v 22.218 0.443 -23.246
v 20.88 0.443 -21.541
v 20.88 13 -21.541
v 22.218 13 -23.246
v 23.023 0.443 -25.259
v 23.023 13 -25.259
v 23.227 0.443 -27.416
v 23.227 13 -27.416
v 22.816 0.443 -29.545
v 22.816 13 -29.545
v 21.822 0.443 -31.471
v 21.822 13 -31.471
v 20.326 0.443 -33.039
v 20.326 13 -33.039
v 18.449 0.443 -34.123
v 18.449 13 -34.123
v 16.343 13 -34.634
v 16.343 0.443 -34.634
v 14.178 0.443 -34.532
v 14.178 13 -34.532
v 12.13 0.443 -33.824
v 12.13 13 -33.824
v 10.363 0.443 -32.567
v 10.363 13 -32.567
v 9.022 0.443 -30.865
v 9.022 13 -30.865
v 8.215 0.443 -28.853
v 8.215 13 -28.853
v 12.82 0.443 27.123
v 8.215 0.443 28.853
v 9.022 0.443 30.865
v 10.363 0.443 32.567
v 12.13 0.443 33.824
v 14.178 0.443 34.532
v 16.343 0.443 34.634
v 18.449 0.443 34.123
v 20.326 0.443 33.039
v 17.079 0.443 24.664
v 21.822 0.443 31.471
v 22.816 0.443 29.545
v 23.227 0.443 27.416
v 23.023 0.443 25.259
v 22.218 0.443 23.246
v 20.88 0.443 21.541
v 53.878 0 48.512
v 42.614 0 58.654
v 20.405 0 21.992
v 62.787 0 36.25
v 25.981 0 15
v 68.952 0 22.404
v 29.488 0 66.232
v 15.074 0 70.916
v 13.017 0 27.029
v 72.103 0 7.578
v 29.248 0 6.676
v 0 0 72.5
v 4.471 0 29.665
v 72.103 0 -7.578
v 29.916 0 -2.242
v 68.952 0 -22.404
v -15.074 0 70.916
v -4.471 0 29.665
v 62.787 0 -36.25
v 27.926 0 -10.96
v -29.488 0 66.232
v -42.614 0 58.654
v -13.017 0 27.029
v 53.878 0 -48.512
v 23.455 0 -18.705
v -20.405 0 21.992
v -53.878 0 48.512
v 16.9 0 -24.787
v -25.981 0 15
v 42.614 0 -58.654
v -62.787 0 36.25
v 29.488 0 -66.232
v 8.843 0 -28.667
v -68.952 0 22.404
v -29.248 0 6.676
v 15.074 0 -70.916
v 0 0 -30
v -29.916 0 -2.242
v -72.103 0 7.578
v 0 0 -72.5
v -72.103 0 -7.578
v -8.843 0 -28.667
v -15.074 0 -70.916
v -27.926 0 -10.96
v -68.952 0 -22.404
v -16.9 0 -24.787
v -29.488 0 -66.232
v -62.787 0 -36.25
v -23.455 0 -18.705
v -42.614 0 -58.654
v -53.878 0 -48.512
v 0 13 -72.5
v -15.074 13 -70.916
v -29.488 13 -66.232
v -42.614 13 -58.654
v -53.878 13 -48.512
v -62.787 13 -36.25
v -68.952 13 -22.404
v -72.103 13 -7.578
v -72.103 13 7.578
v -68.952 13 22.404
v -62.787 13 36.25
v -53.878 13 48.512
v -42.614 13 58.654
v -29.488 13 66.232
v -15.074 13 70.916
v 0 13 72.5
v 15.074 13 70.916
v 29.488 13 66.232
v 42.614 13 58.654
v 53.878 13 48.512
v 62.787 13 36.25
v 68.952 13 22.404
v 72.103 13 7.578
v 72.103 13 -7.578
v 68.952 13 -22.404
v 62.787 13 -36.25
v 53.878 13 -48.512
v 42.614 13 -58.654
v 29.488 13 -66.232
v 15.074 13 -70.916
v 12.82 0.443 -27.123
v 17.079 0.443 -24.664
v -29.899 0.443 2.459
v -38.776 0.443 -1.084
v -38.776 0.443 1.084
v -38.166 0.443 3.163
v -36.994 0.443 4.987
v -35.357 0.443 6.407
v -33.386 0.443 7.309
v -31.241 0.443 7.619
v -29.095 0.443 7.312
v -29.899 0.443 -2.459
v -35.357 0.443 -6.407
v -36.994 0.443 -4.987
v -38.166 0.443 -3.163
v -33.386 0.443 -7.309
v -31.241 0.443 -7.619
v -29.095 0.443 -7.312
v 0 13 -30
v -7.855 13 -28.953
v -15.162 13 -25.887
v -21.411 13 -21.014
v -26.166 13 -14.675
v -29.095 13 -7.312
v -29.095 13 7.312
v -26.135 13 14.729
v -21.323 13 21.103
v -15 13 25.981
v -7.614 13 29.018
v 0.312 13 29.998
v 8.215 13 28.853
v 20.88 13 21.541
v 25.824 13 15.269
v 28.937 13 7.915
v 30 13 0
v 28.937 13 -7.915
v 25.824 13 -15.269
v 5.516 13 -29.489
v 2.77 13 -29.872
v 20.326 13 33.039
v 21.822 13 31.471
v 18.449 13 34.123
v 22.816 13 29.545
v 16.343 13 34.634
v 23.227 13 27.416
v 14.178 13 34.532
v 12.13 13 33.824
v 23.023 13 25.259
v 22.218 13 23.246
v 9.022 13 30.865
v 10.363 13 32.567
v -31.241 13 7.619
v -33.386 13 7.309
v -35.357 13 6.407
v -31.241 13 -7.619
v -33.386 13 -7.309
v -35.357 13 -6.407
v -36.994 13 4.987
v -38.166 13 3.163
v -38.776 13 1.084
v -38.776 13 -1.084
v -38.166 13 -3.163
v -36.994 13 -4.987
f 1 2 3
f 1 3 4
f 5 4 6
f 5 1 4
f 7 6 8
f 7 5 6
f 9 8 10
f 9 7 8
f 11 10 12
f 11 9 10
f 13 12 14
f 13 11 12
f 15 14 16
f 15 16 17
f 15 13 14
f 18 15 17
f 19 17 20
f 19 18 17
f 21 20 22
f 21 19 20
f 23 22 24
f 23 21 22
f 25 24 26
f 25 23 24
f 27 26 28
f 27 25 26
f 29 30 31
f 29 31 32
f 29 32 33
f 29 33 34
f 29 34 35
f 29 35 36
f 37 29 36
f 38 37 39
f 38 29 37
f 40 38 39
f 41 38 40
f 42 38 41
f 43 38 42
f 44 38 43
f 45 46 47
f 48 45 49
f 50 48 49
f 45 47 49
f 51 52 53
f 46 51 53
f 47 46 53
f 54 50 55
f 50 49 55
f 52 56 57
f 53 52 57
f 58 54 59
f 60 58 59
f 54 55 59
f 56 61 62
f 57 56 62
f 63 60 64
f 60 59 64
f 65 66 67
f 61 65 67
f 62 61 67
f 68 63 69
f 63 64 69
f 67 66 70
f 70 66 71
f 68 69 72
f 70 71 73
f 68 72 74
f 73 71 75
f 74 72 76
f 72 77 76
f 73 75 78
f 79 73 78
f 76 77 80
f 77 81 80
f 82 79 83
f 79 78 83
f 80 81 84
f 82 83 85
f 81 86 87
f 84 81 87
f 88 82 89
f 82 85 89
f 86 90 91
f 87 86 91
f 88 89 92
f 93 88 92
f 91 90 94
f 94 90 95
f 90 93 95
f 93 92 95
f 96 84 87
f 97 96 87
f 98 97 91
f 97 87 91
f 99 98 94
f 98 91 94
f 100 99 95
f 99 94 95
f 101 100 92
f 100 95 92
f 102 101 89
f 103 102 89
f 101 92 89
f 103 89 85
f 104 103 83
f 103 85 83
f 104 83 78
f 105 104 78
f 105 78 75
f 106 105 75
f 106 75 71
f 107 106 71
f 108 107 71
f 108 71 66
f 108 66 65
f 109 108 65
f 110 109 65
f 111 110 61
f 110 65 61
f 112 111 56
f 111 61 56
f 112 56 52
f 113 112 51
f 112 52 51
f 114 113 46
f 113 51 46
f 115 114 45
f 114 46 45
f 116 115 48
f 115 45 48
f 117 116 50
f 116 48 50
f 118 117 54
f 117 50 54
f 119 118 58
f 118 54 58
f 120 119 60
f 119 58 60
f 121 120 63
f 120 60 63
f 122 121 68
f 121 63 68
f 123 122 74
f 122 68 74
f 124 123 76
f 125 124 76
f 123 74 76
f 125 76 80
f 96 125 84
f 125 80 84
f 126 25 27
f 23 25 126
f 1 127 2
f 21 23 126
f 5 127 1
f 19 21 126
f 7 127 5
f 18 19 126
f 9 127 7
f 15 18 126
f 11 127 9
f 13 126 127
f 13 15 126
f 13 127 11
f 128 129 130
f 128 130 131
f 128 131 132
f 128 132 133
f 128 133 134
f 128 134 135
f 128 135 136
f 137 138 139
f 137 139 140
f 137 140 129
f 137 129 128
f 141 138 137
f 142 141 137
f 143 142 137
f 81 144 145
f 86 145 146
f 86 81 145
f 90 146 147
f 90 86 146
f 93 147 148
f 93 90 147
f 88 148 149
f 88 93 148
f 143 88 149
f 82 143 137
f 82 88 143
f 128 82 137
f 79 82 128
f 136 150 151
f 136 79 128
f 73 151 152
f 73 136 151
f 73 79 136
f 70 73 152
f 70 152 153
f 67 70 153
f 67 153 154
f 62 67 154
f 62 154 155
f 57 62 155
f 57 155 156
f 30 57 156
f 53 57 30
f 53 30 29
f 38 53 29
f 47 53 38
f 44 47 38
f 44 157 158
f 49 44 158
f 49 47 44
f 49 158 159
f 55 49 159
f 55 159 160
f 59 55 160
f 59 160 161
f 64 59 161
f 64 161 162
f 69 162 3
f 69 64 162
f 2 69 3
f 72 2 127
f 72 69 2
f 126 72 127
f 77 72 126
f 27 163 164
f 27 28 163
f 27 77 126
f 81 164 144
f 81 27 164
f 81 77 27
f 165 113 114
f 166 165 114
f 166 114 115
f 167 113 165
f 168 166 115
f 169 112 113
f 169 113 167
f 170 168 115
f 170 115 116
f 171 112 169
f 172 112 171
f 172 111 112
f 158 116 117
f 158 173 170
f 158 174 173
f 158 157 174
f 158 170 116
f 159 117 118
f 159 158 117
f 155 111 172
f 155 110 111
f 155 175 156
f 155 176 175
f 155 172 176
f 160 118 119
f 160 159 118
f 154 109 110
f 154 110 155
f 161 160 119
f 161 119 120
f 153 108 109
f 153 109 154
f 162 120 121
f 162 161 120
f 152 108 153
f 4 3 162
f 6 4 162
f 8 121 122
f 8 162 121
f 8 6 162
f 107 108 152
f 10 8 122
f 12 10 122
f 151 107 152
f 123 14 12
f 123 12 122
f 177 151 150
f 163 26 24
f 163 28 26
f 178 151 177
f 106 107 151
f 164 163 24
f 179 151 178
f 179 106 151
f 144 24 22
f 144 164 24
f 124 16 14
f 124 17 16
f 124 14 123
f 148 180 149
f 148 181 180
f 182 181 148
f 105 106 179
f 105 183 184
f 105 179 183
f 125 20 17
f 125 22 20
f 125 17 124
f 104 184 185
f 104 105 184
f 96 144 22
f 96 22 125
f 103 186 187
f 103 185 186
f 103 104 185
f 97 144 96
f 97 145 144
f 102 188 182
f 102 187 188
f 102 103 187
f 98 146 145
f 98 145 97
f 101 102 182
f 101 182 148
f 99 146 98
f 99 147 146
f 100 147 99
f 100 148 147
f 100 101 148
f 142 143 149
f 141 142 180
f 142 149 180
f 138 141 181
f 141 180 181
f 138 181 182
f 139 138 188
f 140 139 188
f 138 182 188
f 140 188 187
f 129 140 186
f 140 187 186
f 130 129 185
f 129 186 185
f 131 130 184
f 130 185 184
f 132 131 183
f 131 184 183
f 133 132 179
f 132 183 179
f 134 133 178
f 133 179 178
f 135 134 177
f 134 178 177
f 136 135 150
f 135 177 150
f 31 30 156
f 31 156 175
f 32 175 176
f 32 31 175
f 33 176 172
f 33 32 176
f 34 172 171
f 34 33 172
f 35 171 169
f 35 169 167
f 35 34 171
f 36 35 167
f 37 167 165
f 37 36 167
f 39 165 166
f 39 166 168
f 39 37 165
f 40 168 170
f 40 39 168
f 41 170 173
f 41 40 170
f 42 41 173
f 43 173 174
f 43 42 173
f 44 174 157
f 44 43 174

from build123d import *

# Parameters (mm, degrees)
SKETCH1_R           = 72.5
BOSS_EXTRUDE1_DEPTH = 13
SKETCH2_R           = 30
CUT_EXTRUDE1_DEPTH  = 104.351342517
SKETCH3_R           = 7.618751991
CUT_EXTRUDE2_DEPTH  = 12.556649537
CIRPATTERN1_COUNT   = 3


with BuildPart() as part:
    # Sketch1 → Boss-Extrude1 (new body)
    with BuildSketch(Plane(origin=(0, 0, 0), x_dir=(1, 0, 0), z_dir=(0, 1, 0))):
        Circle(SKETCH1_R)
    extrude(amount=BOSS_EXTRUDE1_DEPTH)

    # Sketch2 → Cut-Extrude1 (cut, through all)
    with BuildSketch(Plane(origin=(0, 0, 0), x_dir=(1, 0, 0), z_dir=(0, 1, 0))):
        Circle(SKETCH2_R)
    extrude(amount=CUT_EXTRUDE1_DEPTH, mode=Mode.SUBTRACT)

    # Sketch3 → Cut-Extrude2 (cut)
    with BuildSketch(Plane(origin=(0, 13, 0), x_dir=(1, 0, 0), z_dir=(0, 1, 0))):
        with Locations((-31.234649967, 0)):
            Circle(SKETCH3_R)
    cut_extrude2 = extrude(amount=-CUT_EXTRUDE2_DEPTH, mode=Mode.SUBTRACT)

    # CirPattern1: Cut-Extrude2 ×3 about axis
    cirpattern1_axis = Axis((0, 0, 0), (0, 1, 0))
    for i in range(1, CIRPATTERN1_COUNT):
        add(cut_extrude2.rotate(cirpattern1_axis, i * 360 / CIRPATTERN1_COUNT), mode=Mode.SUBTRACT)


solid = part.part
